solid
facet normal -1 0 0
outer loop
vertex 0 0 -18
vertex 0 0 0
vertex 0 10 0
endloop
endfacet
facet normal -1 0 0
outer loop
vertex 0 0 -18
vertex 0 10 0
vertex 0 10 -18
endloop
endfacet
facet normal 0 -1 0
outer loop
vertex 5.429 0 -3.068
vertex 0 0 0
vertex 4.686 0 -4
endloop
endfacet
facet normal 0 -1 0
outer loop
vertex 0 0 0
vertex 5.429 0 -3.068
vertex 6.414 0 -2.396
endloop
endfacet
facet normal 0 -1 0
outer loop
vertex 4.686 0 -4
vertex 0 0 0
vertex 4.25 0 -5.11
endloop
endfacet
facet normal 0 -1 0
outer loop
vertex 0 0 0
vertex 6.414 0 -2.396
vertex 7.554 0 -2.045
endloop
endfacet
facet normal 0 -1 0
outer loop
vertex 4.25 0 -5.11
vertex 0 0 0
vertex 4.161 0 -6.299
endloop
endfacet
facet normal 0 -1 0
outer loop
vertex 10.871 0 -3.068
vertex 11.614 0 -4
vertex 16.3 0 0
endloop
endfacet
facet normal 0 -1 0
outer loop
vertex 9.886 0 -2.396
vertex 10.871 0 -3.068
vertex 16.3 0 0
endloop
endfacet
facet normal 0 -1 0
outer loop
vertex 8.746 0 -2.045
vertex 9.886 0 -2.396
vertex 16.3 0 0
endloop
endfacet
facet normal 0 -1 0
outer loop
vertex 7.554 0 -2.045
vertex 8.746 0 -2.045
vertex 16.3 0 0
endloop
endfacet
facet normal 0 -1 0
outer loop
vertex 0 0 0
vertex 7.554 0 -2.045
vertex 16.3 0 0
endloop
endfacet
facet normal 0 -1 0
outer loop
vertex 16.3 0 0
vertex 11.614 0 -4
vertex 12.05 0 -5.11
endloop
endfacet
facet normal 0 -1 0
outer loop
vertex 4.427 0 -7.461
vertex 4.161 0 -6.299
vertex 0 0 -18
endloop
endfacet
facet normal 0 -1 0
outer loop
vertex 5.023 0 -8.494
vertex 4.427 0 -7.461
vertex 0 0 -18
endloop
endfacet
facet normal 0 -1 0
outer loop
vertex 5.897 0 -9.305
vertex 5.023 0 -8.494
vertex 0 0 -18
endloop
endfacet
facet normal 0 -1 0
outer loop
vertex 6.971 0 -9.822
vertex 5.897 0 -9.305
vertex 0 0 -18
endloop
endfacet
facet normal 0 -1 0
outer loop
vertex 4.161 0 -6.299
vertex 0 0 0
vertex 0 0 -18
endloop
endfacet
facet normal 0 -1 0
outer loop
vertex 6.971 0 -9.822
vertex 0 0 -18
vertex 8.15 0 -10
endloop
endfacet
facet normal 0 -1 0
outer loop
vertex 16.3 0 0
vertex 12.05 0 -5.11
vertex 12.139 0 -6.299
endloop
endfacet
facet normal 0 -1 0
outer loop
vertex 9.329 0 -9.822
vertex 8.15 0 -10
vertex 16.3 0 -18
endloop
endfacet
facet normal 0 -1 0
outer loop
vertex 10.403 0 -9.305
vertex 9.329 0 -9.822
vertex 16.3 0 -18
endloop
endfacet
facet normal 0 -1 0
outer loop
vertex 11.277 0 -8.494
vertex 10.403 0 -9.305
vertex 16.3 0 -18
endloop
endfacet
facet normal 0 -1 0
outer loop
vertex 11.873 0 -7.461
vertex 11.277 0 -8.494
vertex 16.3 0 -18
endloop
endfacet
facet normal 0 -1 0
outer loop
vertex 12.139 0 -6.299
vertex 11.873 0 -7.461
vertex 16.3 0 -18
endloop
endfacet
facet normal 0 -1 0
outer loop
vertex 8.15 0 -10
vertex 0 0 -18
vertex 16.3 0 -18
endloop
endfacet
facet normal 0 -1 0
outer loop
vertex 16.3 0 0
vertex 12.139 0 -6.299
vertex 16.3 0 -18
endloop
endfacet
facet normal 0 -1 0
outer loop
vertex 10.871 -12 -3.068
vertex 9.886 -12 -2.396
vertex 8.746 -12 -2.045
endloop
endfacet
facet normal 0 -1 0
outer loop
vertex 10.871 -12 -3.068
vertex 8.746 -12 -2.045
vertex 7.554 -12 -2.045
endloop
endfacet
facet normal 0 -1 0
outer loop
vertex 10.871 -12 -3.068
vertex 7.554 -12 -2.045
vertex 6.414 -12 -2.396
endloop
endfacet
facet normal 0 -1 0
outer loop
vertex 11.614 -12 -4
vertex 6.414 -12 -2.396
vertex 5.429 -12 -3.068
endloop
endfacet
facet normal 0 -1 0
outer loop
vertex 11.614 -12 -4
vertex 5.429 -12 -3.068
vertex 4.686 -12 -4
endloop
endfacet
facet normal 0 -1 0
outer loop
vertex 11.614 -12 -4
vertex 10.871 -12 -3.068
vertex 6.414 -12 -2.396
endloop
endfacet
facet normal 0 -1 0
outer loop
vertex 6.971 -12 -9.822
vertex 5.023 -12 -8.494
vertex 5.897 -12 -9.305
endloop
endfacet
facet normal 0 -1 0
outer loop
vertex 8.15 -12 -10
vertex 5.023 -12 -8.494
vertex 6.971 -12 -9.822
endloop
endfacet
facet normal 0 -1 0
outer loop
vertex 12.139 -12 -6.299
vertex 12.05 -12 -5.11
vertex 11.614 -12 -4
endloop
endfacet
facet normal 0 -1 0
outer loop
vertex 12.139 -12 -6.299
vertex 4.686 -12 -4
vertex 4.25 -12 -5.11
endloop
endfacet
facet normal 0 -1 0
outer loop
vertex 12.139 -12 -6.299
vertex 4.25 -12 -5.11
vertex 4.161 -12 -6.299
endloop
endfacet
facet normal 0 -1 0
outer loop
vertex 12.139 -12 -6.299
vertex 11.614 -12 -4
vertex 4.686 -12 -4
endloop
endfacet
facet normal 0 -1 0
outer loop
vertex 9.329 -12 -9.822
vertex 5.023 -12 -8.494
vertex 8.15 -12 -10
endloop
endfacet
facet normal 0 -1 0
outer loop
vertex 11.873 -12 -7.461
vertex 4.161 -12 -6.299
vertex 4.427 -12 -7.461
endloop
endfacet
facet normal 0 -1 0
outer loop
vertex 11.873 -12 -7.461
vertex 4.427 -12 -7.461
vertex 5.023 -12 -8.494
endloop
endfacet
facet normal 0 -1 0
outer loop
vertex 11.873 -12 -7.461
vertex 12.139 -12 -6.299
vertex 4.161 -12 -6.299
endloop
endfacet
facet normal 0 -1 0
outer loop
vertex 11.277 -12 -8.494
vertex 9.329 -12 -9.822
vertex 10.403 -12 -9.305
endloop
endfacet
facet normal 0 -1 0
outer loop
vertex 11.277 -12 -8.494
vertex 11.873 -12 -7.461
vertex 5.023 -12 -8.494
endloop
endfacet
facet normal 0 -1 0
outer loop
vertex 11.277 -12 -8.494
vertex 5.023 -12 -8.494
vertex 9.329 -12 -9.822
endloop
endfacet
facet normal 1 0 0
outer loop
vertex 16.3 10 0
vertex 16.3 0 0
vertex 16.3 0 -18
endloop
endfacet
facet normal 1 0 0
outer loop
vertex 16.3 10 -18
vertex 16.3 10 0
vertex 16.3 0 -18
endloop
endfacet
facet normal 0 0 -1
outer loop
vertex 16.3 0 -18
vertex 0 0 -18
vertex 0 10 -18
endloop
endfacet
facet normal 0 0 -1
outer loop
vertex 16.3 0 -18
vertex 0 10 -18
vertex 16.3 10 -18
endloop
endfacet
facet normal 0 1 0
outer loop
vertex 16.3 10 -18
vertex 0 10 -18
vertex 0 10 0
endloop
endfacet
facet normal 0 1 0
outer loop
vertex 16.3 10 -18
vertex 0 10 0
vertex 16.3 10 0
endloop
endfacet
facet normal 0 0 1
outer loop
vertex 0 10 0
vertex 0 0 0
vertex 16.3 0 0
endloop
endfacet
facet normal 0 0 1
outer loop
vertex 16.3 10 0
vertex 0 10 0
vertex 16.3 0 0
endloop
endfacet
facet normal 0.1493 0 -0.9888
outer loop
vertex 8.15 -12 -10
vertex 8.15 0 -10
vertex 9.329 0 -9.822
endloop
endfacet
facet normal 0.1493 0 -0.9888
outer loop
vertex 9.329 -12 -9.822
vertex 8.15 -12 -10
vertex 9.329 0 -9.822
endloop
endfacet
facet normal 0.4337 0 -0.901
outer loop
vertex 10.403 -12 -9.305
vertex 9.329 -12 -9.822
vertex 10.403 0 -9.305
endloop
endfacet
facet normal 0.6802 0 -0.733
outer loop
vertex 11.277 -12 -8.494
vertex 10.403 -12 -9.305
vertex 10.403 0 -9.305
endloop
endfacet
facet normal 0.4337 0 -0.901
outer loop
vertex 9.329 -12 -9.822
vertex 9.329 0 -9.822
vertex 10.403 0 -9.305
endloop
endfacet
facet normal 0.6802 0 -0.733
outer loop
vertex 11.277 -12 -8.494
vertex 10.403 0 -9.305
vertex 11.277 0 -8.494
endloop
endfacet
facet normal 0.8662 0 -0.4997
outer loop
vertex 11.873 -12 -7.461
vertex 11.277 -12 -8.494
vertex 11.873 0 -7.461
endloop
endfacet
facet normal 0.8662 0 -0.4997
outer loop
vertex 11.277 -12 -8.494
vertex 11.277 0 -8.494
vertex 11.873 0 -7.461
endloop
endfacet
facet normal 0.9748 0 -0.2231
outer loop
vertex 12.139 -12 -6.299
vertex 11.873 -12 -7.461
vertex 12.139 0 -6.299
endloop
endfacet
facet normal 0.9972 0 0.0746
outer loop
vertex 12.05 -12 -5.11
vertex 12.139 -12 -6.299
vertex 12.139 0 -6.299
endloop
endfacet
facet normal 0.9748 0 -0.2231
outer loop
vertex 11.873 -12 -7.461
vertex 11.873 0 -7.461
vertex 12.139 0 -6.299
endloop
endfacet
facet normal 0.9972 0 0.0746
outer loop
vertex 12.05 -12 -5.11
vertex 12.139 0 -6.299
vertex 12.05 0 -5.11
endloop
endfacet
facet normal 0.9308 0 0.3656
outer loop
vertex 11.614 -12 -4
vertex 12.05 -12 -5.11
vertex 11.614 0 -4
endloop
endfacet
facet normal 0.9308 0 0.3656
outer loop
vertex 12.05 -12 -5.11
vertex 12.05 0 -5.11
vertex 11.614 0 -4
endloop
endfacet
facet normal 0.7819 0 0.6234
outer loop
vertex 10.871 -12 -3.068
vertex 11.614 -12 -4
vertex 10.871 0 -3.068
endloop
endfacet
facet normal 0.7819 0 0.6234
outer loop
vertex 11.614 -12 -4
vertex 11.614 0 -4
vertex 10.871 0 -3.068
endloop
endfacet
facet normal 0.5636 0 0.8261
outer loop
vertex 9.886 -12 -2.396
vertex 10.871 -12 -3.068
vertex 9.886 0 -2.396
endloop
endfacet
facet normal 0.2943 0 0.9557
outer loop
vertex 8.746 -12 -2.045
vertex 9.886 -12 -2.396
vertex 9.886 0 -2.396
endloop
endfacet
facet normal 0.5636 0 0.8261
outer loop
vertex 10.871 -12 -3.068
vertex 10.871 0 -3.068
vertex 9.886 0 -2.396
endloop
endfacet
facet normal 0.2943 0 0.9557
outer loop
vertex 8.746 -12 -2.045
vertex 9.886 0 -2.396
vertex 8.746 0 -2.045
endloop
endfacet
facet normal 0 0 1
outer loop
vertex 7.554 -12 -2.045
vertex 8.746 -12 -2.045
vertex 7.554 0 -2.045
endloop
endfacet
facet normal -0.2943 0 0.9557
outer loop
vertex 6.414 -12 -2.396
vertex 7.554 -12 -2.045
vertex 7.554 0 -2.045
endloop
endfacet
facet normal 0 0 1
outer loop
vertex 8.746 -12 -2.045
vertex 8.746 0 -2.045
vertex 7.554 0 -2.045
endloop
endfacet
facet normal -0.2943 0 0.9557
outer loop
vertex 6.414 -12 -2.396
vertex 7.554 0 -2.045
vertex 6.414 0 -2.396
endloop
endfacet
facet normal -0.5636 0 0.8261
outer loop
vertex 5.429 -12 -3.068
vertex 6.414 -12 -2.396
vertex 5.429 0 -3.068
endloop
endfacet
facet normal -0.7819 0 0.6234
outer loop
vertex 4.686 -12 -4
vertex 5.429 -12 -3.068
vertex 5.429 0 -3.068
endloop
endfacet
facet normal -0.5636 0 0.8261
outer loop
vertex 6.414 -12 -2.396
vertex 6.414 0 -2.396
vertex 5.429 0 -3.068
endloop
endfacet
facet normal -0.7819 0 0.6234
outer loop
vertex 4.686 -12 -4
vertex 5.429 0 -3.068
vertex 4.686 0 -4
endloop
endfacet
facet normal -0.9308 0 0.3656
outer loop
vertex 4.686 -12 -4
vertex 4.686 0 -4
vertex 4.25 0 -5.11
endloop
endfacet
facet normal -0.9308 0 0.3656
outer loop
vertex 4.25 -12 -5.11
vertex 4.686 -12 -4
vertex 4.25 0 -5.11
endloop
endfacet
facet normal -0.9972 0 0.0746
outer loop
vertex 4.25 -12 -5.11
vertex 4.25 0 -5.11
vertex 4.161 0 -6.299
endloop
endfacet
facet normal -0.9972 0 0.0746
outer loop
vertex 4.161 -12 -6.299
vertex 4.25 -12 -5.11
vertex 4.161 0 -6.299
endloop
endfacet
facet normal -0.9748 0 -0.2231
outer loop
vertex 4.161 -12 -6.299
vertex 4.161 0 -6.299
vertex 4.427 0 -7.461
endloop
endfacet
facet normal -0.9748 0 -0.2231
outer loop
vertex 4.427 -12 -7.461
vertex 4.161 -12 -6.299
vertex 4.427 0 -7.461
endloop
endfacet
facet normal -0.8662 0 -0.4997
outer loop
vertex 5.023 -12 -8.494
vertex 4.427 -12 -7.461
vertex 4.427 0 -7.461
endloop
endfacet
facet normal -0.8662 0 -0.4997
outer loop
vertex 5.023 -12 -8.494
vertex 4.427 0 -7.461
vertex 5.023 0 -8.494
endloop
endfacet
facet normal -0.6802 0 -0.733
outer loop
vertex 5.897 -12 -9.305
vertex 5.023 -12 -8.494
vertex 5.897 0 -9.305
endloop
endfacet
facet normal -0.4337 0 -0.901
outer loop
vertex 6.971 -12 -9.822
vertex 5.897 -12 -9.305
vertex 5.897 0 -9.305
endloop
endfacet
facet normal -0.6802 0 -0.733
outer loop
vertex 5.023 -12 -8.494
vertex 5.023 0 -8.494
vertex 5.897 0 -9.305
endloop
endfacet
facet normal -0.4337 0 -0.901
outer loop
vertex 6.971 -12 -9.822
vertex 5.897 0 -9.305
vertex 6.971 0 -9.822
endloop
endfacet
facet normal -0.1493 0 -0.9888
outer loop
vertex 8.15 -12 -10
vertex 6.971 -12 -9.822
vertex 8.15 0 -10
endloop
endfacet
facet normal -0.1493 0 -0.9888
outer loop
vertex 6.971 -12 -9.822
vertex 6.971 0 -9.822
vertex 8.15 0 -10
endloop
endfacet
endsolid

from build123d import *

# Parameters (mm, degrees)
SKETCH_1_W      = 16.3
SKETCH_1_H      = 18
EXTRUDE_1_DEPTH = 10
SKETCH_3_R      = 4
EXTRUDE_2_DEPTH = 12


with BuildPart() as part:
    # Эскиз1 → Бобышка-Вытянуть1 (new body)
    with BuildSketch(Plane(origin=(0, 0, 0), x_dir=(1, 0, 0), z_dir=(0, 1, 0))):
        with Locations((8.15, 9)):
            Rectangle(SKETCH_1_W, SKETCH_1_H)
    extrude(amount=EXTRUDE_1_DEPTH)

    # Эскиз3 → Бобышка-Вытянуть2 (add)
    with BuildSketch(Plane.XZ):
        with Locations(Location((8.15, -6, 0), (0, 0, 270))):
            Circle(SKETCH_3_R)
    extrude(amount=EXTRUDE_2_DEPTH)


solid = part.part
